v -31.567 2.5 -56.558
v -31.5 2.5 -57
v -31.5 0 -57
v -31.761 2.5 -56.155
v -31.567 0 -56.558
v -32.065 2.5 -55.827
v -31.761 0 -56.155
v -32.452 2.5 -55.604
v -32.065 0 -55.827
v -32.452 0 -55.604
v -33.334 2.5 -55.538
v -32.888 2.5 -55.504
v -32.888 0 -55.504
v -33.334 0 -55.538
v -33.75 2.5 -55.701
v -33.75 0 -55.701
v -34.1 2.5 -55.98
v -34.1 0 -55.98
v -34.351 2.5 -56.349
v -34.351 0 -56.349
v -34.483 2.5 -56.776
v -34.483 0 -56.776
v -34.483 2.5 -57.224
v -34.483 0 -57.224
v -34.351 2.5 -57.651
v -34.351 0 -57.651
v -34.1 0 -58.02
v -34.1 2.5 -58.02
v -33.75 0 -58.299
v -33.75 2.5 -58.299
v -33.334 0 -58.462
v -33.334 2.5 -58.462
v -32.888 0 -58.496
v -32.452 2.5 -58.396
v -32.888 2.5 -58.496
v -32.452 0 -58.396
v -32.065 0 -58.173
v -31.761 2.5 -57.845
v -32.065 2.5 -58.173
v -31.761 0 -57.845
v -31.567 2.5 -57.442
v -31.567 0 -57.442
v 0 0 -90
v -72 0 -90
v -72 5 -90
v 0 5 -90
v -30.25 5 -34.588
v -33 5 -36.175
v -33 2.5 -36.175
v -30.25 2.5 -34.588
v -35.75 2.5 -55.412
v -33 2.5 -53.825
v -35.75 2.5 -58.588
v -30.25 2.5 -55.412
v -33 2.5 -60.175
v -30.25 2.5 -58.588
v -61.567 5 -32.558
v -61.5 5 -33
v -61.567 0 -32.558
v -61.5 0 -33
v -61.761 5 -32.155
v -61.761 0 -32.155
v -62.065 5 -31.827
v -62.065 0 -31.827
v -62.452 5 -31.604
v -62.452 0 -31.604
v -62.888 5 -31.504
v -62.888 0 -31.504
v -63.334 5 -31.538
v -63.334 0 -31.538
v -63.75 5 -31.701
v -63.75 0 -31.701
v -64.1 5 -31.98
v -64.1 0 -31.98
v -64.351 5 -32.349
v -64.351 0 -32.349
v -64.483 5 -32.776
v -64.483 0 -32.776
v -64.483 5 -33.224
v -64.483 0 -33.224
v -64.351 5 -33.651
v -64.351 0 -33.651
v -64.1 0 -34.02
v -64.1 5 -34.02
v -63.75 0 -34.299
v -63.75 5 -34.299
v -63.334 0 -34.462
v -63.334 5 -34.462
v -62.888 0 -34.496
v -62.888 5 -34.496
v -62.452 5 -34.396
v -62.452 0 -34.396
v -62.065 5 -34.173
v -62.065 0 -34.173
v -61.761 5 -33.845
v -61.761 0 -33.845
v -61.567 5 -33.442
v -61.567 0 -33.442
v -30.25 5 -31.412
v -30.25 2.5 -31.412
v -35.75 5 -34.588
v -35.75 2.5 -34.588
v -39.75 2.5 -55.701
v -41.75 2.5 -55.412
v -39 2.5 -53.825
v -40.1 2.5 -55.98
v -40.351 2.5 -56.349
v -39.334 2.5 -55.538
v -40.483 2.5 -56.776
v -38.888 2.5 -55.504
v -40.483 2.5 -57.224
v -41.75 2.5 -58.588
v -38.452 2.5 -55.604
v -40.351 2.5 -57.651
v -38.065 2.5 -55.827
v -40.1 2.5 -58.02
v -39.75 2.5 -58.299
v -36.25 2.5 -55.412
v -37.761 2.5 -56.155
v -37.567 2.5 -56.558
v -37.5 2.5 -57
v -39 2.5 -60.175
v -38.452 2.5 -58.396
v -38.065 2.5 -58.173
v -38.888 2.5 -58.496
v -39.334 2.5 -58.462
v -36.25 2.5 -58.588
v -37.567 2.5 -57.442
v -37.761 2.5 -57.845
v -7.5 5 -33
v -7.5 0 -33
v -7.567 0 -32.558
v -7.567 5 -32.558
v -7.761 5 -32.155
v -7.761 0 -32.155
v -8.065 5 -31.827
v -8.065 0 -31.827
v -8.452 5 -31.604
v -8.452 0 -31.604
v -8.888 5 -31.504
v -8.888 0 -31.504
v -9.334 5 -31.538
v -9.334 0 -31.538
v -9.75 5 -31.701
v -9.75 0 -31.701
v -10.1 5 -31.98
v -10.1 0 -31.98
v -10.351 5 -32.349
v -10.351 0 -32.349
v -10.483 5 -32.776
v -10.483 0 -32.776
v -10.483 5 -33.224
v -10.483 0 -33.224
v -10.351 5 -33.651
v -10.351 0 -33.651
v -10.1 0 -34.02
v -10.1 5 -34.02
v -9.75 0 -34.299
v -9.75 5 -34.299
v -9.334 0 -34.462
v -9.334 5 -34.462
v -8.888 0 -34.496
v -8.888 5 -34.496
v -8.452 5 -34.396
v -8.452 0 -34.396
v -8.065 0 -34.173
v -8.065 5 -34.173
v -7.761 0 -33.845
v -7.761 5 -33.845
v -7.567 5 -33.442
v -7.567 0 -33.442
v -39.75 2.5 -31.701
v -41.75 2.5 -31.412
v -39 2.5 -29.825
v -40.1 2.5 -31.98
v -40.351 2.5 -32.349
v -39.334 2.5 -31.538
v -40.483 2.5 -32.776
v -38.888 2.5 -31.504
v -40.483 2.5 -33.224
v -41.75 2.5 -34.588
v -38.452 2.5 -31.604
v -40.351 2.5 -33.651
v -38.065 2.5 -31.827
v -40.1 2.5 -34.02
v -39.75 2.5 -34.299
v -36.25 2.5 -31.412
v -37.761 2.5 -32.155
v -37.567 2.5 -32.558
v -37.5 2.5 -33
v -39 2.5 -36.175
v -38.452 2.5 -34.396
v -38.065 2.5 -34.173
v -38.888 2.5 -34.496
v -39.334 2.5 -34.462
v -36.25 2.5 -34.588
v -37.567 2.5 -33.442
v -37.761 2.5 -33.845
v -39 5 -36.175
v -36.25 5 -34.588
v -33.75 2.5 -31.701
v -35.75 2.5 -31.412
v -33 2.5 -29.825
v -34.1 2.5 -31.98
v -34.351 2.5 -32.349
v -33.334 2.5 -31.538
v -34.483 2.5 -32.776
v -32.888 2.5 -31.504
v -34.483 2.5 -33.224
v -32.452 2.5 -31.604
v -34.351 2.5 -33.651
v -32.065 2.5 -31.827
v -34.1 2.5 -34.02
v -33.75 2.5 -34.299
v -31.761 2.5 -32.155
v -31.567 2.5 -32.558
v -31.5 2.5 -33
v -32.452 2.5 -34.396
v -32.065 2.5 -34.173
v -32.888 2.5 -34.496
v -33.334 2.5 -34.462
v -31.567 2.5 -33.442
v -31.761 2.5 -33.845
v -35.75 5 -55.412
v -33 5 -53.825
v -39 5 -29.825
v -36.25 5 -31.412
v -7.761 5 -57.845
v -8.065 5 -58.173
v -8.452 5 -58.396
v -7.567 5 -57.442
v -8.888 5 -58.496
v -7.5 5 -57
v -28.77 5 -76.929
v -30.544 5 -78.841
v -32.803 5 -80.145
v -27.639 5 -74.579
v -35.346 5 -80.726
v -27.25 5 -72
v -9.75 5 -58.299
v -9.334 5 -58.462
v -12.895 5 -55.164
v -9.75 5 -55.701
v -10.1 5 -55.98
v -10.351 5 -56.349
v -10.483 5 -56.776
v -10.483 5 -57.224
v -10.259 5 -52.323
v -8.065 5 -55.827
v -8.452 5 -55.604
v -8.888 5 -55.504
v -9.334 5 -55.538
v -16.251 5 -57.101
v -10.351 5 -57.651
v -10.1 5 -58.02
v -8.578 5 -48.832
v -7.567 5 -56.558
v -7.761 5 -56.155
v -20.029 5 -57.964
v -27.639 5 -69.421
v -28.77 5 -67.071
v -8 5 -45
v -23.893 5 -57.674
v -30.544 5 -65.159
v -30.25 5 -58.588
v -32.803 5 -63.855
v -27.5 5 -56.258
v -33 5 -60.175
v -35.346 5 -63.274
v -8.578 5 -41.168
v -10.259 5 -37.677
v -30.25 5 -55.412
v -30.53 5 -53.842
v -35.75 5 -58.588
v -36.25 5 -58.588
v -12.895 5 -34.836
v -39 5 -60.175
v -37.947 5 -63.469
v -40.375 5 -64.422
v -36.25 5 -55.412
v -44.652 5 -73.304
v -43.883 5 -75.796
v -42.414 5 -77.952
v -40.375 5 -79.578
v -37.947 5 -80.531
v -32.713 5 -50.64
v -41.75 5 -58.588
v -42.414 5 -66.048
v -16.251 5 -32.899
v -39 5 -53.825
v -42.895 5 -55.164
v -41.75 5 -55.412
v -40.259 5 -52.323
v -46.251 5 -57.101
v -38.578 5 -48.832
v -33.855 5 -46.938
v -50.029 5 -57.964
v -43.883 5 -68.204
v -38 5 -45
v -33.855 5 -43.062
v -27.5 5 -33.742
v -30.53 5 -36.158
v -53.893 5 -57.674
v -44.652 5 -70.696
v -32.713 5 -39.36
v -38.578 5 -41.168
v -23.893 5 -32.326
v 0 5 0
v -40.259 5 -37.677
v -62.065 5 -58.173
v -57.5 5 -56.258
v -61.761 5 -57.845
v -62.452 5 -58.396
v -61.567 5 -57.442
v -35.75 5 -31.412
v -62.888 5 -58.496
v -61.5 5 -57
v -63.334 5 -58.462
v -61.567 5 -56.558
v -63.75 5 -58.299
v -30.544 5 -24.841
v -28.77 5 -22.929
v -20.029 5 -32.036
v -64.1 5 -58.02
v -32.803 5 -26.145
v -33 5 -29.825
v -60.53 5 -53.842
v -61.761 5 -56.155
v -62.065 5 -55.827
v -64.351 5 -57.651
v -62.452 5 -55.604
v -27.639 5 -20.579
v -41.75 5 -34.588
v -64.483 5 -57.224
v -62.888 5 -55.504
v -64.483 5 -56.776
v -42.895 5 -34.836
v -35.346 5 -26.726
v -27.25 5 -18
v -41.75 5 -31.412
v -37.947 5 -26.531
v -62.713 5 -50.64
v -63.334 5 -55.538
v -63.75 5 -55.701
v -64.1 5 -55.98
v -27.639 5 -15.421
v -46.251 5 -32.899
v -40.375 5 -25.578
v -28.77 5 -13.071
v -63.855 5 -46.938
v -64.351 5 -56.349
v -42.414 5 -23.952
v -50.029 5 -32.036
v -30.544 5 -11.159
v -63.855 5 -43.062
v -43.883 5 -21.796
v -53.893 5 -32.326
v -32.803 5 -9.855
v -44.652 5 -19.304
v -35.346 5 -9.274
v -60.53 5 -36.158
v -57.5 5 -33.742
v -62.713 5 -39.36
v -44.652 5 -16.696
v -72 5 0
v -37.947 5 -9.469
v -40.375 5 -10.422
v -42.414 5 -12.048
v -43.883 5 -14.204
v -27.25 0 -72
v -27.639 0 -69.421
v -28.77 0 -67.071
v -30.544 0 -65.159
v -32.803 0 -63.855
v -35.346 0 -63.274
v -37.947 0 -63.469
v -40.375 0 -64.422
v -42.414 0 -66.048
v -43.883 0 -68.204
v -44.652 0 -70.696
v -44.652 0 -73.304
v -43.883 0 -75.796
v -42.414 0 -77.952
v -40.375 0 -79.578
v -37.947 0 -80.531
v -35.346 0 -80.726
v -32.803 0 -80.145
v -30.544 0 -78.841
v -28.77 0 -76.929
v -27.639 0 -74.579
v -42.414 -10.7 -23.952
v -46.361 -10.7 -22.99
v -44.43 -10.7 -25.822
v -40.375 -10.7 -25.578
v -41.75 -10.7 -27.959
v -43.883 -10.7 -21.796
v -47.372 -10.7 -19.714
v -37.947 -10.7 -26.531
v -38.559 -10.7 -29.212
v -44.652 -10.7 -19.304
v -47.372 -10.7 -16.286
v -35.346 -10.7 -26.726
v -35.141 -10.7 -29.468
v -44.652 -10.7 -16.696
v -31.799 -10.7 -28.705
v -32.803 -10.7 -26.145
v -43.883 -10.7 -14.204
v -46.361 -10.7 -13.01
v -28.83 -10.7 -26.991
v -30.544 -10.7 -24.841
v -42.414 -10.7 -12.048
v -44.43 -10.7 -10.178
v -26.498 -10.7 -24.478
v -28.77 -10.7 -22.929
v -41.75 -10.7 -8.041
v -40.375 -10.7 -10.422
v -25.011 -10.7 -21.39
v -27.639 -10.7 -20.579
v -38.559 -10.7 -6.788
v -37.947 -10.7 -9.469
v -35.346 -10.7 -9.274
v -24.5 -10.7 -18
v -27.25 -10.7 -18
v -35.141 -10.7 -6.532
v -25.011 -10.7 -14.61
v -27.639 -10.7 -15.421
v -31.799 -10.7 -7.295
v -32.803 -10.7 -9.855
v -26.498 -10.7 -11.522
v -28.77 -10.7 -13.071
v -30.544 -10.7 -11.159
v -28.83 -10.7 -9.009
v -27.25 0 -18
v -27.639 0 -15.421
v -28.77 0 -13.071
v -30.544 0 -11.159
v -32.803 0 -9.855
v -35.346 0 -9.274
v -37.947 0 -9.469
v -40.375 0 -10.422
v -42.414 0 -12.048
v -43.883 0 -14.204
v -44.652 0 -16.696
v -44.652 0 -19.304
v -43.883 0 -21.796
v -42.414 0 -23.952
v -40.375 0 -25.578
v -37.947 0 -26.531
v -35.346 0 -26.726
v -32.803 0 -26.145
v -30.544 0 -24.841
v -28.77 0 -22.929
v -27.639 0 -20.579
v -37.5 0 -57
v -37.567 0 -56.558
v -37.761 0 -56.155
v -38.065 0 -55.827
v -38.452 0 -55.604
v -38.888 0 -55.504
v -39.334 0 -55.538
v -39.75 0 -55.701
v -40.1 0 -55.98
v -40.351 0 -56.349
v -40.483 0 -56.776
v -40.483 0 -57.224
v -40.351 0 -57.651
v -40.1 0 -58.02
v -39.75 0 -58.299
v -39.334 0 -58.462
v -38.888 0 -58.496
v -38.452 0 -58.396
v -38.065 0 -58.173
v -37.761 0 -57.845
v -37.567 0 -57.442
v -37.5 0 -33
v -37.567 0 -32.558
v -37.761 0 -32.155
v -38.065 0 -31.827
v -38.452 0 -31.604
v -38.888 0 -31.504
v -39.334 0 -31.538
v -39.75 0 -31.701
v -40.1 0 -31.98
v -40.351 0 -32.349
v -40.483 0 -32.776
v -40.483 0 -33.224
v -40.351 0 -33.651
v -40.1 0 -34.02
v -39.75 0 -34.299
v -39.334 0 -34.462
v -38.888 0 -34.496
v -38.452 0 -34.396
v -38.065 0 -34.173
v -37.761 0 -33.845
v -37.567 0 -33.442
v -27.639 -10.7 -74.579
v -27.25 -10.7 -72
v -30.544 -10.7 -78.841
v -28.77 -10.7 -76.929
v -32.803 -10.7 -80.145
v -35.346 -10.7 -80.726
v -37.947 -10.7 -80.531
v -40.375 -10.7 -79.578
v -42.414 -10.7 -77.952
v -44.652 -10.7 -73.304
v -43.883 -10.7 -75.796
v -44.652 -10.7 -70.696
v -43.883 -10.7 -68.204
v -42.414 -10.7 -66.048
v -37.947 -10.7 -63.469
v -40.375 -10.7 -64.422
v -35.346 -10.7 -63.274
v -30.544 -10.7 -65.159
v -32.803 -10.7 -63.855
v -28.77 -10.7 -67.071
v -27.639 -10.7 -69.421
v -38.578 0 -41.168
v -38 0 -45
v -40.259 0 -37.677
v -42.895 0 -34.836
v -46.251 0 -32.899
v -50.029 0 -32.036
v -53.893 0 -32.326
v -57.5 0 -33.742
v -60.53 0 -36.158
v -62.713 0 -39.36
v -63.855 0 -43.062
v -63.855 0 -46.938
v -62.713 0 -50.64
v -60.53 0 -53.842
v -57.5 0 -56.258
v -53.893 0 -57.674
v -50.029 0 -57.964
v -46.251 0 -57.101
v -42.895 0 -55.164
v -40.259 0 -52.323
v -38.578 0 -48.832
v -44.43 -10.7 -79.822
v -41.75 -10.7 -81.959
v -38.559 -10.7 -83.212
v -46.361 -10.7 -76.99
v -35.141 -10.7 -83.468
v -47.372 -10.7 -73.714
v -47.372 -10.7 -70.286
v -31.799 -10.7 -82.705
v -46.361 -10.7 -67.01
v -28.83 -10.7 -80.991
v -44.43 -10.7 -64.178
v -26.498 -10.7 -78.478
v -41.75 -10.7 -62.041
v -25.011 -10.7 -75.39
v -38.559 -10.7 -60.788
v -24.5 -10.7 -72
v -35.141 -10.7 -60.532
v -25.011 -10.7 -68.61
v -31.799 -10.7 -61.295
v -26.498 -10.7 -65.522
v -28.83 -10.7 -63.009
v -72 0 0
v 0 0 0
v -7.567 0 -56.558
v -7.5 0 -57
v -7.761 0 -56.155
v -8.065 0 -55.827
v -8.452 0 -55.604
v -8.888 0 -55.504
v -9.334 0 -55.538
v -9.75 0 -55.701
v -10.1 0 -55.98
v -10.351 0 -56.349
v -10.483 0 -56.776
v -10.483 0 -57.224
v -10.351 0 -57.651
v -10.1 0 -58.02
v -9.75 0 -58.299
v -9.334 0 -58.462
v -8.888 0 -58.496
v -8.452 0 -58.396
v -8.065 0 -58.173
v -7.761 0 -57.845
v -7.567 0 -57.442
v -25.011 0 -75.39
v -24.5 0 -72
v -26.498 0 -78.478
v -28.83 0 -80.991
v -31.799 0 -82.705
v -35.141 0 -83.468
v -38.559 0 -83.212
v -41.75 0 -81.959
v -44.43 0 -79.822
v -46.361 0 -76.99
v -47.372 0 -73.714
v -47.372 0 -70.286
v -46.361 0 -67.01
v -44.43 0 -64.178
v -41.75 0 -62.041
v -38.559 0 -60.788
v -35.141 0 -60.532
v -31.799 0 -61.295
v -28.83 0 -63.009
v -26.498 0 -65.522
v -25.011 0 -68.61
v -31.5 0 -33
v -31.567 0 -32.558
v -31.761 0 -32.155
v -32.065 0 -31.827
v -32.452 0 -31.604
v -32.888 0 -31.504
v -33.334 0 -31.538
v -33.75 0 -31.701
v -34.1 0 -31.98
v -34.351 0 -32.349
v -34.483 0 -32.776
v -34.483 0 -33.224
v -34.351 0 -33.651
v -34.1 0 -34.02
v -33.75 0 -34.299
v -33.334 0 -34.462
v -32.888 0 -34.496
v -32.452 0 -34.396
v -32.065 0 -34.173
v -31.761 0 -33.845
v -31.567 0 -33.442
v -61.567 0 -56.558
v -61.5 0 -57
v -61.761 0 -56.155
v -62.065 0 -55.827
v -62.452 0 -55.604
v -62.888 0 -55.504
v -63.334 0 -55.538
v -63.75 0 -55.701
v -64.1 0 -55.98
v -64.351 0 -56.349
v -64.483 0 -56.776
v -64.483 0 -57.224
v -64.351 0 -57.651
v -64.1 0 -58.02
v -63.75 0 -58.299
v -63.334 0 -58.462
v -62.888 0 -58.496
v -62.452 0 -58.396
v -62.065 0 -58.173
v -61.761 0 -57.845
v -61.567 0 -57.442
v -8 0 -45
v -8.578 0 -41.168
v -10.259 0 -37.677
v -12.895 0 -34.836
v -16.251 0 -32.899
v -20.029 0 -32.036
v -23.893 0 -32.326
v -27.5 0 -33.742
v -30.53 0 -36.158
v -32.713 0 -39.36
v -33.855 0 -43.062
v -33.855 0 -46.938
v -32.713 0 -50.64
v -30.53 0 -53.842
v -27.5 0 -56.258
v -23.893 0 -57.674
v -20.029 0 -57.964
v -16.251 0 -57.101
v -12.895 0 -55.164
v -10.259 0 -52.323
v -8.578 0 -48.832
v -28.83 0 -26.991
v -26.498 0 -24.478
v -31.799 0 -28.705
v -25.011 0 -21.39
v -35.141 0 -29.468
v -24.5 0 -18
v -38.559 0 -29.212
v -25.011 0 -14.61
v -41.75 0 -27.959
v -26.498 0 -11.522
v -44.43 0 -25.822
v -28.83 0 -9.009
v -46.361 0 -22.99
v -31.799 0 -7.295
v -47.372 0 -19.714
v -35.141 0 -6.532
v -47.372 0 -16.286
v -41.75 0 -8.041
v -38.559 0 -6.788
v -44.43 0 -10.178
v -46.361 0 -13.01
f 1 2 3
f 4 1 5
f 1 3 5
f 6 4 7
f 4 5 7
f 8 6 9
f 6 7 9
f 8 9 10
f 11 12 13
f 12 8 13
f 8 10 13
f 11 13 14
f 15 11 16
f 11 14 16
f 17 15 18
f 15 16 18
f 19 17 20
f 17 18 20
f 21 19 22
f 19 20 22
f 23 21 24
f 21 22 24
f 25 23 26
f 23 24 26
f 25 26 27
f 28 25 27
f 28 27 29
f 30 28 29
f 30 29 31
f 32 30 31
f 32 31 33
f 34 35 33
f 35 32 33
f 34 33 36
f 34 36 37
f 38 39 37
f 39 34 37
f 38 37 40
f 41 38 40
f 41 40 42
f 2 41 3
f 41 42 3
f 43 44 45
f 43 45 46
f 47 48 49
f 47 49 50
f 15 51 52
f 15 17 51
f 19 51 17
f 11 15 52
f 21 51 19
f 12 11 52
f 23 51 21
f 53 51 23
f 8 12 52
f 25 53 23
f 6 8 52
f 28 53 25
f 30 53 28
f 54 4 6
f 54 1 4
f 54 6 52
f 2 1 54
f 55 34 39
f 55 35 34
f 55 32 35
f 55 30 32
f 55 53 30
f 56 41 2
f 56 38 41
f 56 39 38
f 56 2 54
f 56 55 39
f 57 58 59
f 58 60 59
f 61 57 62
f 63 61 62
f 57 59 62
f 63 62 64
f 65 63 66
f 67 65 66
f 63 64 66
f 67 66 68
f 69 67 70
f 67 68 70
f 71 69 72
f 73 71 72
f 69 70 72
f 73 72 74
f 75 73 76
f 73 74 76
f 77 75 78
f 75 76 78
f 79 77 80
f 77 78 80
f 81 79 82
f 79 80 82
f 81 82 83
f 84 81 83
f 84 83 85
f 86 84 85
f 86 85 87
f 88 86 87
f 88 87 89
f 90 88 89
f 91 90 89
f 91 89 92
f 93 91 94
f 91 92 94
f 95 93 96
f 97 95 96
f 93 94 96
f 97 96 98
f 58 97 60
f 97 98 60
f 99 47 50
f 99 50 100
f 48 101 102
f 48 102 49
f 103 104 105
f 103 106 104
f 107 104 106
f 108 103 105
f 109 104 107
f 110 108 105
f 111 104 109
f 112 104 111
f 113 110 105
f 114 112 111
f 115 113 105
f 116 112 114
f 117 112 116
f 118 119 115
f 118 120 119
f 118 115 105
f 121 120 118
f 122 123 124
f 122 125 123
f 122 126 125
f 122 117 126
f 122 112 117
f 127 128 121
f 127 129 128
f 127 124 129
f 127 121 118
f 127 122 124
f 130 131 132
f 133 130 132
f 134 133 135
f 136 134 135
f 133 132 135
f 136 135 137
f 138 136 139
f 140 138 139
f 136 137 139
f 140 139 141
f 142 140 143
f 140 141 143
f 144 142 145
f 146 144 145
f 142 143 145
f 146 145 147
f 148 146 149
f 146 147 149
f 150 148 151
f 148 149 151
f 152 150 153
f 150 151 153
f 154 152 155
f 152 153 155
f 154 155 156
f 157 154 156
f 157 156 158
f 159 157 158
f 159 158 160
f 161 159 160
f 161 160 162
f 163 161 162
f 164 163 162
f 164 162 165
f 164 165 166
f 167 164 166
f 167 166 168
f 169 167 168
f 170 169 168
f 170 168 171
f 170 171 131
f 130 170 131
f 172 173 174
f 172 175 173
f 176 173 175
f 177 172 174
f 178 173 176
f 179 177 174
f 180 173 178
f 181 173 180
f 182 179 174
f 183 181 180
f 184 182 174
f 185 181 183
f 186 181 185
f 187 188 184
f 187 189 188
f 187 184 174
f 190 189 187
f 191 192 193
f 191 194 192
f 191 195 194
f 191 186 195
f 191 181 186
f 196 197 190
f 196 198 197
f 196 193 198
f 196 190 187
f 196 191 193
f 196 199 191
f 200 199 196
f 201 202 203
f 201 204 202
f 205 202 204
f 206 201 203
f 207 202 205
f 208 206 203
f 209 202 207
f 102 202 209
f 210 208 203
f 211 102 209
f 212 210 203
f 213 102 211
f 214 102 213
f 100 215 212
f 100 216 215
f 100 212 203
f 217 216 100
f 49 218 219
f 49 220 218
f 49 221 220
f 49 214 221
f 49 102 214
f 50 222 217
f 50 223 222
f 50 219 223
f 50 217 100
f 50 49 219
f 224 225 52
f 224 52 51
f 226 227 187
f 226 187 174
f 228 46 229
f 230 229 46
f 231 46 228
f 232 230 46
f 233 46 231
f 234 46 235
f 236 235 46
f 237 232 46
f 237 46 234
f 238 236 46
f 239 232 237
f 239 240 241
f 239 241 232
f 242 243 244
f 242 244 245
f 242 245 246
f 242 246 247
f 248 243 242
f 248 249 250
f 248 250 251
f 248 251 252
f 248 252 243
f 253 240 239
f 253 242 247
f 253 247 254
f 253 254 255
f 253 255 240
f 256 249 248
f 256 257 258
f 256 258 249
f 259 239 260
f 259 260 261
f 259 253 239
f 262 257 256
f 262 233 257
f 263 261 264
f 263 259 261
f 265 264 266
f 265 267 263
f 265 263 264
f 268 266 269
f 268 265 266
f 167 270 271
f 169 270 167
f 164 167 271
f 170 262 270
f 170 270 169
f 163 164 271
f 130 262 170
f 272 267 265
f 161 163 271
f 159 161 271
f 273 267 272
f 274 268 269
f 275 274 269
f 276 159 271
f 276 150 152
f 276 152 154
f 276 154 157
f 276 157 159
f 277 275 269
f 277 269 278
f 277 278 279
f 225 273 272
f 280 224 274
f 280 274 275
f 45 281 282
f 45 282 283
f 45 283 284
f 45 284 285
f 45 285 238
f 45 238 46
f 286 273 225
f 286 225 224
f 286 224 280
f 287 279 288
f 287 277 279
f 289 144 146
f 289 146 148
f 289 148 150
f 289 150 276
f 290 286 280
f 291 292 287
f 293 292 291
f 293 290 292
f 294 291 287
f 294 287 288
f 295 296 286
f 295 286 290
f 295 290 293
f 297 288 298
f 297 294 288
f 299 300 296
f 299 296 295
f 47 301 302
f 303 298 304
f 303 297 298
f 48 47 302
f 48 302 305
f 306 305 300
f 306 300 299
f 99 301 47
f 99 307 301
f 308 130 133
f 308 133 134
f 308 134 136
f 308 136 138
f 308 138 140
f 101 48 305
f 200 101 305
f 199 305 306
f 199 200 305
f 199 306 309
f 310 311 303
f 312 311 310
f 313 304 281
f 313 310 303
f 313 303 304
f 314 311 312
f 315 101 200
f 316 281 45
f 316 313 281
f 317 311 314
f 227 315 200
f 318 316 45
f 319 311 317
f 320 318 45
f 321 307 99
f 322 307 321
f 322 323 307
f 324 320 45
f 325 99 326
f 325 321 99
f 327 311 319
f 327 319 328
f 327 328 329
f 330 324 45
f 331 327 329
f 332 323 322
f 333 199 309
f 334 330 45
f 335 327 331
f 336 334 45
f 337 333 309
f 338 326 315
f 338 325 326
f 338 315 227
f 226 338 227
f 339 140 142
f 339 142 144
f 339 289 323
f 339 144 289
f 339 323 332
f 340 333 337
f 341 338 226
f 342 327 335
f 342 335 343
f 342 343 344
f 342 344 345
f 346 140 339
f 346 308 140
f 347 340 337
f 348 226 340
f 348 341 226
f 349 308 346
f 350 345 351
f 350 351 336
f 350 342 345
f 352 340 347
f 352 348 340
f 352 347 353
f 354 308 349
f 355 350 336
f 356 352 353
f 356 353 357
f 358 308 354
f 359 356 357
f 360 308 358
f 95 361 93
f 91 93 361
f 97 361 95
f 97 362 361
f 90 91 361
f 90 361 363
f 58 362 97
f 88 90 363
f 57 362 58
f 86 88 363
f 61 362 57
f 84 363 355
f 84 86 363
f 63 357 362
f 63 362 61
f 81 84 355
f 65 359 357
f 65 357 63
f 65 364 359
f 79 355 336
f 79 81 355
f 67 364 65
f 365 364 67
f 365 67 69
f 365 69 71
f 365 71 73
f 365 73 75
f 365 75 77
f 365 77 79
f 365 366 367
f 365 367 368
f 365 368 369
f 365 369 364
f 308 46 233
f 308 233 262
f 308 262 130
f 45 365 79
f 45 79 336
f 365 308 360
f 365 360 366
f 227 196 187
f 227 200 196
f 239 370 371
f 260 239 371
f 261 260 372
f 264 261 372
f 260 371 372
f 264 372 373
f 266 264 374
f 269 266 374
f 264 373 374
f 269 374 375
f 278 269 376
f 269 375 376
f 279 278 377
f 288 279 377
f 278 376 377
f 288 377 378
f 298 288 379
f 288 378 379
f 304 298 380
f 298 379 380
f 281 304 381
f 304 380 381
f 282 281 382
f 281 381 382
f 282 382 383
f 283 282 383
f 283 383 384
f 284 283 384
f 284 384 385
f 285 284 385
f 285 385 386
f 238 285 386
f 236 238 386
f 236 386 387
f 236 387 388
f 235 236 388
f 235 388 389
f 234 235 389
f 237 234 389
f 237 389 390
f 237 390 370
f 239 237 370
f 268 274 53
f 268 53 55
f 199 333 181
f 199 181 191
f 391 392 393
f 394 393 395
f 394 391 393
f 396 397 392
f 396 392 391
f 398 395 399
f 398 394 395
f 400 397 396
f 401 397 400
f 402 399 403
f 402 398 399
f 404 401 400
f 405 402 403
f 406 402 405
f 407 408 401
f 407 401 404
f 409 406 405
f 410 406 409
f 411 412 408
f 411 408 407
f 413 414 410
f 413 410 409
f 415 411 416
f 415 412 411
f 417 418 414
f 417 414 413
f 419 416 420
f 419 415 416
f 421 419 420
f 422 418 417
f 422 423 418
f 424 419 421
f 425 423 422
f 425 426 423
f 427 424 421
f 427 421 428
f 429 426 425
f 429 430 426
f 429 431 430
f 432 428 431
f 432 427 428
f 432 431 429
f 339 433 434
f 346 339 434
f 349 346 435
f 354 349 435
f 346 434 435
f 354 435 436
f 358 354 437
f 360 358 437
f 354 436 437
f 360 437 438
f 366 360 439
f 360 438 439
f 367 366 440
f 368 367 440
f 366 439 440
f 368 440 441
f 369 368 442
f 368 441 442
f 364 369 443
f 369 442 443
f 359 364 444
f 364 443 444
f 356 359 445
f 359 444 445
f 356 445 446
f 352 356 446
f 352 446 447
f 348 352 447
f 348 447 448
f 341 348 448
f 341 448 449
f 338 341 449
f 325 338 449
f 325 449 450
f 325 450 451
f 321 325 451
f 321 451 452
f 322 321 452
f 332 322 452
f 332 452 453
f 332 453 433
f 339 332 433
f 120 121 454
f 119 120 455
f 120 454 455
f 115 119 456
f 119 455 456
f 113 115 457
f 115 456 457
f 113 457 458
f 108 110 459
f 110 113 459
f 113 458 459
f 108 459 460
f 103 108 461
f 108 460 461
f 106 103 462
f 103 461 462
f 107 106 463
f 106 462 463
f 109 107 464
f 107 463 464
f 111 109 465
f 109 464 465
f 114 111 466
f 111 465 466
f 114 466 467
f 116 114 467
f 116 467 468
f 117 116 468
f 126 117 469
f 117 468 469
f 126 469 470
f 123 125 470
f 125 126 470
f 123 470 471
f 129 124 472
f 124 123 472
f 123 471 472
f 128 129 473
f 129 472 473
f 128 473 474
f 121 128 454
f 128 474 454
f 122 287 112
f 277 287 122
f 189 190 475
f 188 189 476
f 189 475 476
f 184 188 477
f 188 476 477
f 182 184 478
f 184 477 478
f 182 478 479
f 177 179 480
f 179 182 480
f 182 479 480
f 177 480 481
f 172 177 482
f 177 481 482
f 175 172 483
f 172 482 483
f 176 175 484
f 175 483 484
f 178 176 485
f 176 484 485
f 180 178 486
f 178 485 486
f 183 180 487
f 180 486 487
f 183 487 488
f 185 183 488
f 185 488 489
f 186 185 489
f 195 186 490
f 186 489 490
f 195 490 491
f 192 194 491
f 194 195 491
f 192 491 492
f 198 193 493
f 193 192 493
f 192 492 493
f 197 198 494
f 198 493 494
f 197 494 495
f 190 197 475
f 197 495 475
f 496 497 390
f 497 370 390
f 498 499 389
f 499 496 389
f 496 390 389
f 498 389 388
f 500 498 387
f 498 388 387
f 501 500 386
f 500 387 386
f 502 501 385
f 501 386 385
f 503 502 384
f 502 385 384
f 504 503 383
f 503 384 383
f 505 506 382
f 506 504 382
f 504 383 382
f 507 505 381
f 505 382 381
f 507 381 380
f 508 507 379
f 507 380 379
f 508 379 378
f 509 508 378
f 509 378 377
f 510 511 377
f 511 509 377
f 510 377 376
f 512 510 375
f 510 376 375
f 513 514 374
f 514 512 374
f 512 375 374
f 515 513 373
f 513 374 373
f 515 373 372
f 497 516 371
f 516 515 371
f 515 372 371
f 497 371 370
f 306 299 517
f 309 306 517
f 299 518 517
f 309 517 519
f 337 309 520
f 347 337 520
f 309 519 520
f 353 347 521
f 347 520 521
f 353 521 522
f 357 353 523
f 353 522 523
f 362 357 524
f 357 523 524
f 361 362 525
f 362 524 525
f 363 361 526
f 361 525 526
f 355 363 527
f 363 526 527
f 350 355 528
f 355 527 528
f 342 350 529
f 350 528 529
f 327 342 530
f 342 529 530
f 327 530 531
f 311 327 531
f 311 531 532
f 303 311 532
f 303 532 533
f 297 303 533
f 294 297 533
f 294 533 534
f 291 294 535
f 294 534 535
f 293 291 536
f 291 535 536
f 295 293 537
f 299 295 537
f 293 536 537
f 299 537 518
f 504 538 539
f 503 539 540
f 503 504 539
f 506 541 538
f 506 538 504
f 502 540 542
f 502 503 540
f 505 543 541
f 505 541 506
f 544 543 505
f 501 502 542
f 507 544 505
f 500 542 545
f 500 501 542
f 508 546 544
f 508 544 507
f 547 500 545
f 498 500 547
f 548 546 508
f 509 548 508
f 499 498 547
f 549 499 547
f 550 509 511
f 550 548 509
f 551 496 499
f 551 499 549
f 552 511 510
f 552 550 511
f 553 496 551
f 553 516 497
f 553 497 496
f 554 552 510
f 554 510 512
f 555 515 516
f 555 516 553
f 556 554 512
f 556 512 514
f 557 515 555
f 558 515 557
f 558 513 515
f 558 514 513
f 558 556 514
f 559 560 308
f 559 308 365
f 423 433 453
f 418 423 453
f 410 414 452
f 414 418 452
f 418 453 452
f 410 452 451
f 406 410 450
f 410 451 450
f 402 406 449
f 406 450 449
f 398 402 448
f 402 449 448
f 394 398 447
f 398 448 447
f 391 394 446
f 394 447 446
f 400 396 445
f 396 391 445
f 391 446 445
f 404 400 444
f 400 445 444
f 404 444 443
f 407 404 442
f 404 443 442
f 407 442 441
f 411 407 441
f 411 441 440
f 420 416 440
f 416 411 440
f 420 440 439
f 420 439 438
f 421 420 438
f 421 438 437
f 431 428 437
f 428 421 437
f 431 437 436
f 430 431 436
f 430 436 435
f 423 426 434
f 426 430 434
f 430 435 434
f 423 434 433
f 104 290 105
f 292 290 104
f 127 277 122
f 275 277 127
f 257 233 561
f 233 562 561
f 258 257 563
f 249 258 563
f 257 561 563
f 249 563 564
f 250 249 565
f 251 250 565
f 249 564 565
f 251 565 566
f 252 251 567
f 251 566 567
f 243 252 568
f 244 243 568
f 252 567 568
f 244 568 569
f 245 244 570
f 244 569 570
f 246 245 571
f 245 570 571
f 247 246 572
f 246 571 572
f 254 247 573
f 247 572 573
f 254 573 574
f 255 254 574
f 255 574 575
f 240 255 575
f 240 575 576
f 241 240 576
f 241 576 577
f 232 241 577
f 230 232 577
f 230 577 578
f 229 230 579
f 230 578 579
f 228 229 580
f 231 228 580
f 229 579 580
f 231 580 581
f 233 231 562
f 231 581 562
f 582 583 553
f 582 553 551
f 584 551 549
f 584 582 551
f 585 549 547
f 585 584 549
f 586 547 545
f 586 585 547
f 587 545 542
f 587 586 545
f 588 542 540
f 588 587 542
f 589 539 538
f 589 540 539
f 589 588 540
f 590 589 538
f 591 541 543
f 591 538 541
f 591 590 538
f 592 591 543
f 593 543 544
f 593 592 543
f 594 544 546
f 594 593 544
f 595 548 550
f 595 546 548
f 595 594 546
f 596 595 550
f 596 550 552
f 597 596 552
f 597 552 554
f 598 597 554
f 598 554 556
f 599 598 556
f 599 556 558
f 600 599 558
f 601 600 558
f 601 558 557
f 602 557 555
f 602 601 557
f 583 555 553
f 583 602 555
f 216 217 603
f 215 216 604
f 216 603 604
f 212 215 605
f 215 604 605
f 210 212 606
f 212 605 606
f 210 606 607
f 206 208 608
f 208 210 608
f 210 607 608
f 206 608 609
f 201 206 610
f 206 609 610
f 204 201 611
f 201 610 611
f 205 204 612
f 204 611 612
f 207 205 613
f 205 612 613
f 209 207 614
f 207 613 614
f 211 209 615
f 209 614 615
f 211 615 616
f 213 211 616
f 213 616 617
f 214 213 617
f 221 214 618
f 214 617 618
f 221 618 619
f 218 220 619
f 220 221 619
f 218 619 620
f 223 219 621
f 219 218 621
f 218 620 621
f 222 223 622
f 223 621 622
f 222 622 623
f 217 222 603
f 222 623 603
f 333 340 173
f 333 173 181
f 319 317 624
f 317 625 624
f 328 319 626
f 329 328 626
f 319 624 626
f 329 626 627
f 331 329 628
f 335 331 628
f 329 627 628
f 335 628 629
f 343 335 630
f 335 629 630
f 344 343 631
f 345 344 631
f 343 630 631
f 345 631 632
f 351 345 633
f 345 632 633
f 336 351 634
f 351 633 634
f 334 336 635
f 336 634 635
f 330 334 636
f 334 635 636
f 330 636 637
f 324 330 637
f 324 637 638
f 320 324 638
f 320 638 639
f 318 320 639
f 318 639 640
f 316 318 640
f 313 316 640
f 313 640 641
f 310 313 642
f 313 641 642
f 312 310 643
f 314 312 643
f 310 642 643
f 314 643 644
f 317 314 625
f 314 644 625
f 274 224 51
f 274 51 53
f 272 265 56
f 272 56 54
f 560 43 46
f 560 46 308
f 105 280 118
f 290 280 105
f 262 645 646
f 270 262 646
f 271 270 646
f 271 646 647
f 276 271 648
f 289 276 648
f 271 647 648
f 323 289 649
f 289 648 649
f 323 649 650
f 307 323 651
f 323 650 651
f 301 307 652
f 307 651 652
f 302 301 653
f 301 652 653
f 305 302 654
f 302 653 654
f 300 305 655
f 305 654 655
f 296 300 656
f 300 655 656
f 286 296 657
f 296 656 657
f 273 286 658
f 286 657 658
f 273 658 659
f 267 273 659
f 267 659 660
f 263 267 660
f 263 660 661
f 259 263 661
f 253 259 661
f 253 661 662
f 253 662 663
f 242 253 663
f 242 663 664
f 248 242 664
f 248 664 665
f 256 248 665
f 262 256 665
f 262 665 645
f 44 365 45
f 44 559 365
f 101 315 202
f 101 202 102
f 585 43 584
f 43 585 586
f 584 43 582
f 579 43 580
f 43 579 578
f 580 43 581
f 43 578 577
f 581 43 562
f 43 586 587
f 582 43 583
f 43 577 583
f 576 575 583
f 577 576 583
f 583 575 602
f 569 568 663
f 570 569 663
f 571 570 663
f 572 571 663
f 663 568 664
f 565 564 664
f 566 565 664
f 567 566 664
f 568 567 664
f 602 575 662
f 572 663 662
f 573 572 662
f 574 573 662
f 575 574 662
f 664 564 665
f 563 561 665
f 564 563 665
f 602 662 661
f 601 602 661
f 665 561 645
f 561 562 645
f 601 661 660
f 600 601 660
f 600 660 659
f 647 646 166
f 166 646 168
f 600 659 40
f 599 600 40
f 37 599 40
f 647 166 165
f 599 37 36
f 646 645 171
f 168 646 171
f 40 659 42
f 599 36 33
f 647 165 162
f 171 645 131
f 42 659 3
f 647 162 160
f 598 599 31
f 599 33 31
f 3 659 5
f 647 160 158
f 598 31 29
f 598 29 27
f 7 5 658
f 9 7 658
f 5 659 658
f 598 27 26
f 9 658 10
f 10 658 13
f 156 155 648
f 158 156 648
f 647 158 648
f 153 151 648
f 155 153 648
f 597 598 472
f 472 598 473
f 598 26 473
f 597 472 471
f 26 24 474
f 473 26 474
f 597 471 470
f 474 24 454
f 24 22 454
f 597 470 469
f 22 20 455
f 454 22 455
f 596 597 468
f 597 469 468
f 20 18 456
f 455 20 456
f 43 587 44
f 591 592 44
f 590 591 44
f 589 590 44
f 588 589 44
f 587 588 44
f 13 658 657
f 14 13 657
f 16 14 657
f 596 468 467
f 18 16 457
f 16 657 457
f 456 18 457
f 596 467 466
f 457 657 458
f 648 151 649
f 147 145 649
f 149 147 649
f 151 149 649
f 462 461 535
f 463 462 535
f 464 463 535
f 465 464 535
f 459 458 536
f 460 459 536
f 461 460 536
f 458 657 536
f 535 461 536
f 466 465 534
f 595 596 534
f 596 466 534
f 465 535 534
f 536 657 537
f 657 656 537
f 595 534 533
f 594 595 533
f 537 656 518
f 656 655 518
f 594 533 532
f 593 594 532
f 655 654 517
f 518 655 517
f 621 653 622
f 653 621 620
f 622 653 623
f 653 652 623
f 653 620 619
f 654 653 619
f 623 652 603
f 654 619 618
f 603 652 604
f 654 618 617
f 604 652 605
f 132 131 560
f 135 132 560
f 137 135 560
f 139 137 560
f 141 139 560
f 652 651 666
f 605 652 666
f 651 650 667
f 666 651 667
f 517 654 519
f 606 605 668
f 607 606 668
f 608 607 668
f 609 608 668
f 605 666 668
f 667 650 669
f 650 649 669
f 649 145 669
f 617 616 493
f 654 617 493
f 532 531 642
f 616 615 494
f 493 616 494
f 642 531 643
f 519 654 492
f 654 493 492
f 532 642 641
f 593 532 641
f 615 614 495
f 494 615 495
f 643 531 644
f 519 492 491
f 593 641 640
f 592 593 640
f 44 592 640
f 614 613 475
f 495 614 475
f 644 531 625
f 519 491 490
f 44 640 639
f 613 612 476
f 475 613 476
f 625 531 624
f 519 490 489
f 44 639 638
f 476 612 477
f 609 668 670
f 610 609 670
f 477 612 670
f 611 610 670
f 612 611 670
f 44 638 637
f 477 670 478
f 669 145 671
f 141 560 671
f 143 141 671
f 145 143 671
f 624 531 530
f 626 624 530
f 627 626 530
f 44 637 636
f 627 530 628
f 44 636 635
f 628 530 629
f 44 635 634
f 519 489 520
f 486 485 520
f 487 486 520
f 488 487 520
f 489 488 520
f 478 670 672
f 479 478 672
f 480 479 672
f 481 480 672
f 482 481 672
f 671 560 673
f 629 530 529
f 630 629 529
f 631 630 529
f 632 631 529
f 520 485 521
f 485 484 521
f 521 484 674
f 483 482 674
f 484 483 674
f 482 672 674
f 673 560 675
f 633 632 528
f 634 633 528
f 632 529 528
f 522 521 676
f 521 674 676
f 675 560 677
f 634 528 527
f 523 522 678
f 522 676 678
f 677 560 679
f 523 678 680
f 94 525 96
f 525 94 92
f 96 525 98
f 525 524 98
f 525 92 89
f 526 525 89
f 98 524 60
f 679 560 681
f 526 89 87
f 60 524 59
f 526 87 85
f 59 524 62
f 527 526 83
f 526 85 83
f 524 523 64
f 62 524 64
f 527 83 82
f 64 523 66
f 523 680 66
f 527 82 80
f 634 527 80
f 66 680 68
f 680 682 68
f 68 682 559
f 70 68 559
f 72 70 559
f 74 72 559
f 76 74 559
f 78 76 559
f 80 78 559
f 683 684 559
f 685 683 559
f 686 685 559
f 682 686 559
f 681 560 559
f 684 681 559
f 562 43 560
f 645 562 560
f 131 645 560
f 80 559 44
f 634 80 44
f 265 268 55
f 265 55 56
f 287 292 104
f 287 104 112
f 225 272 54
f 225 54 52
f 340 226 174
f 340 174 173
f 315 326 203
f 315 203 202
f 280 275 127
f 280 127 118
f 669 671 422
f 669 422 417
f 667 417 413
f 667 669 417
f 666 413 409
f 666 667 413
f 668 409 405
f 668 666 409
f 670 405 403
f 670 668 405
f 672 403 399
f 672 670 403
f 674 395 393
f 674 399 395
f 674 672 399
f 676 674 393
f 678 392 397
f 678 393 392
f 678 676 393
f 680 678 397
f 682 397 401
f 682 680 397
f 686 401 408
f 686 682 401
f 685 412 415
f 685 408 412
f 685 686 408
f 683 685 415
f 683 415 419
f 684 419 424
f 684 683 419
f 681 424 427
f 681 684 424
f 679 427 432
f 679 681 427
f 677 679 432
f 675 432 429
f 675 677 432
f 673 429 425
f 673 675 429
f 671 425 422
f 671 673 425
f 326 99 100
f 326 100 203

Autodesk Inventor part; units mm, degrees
ref_plane "YZ Plane" through (0, 0, 0) normal (1, 0, 0) x (0, 1, 0)
ref_plane "XZ Plane" through (0, 0, 0) normal (0, 1, 0) x (-1, 0, 0)
ref_plane "XY Plane" through (0, 0, 0) normal (0, 0, 1) x (1, 0, 0)
sketch "Sketch1" plane through (0, 0, 0) normal (0, 1, 0) x (-1, 0, 0)
  line L0 (0, 0) -> (72, 0)
  line L1 (72, 0) -> (72, -90)
  line L2 (72, -90) -> (0, -90)
  line L3 (0, -90) -> (0, 0)
  dimension "d0" = 72
  dimension "d1" = 90
extrude "Extrusion1" add sketch "Sketch1" along normal blind 5
sketch "Sketch2" plane through (0, 0, 0) normal (0, -1, 0) x (1, 0, 0)
  line L0 (-72, 0) -> (-72, -90) projected
  line L1 (-72, -90) -> (0, -90) projected
  circle A0 centre (-36, -72) radius 8.75
  circle A1 centre (-36, -18) radius 8.75
  circle A2 centre (-36, -18) radius 11.5
  circle A3 centre (-36, -72) radius 11.5
  dimension "d4" = 17.5
  dimension "d5" = 23
  dimension "d6" = 54
  dimension "d7" = 18
  dimension "d8" = 36
extrude "Extrusion2" add sketch "Sketch2" along normal blind 10.7
sketch "Sketch3" plane through (-36, 0, -18) normal (0, -1, 0) x (1, 0, 0)
  circle A0 centre (0, 0) radius 8.75 projected
  circle A1 centre (0, -54) radius 8.75 projected
  point P0 (36, 18)
extrude "Extrusion3" cut sketch "Sketch3" against normal up to surface (5 mm away)
sketch "Sketch4" plane through (0, 0, 0) normal (0, -1, 0) x (1, 0, 0)
  line L0 (0, 0) -> (-72, 0) projected
  line L1 (-72, 0) -> (-72, -90) projected
  line L2 (0, -90) -> (0, 0) projected
  circle A0 centre (-21, -45) radius 13
  circle A1 centre (-51, -45) radius 13
  dimension "d14" = 26
  dimension "d16" = 21
  dimension "d17" = 21
  dimension "d18" = 45
extrude "Extrusion4" cut sketch "Sketch4" against normal up to surface (5 mm away)
sketch "Sketch5" plane through (0, 0, 0) normal (0, -1, 0) x (1, 0, 0)
  circle A0 centre (-21, -45) radius 13 projected
  circle A1 centre (-51, -45) radius 13 projected
  circle A2 centre (-9, -57) radius 1.5
  circle A3 centre (-9, -33) radius 1.5
  circle A4 centre (-33, -57) radius 1.5
  circle A5 centre (-33, -33) radius 1.5
  circle A6 centre (-39, -33) radius 1.5
  circle A7 centre (-39, -57) radius 1.5
  circle A8 centre (-63, -57) radius 1.5
  circle A9 centre (-63, -33) radius 1.5
  dimension "d21" = 3
  dimension "d22" = 24
  dimension "d23" = 24
  dimension "d24" = 24
  dimension "d25" = 12
  dimension "d26" = 12
  dimension "d27" = 12
extrude "Extrusion5" cut sketch "Sketch5" against normal up to surface (5 mm away) contours A2 | A3 | A4 | A5 | A6 | A7 | A8 | A9
sketch "Sketch6" plane through (0, 5, 0) normal (0, 1, 0) x (1, 0, 0)
  circle A0 centre (-39, 57) radius 1.5 projected
  circle A1 centre (-33, 33) radius 1.5 projected
  circle A2 centre (-33, 57) radius 1.5 projected
  circle A3 centre (-39, 33) radius 1.5 projected
  line L0 (-39, 60.1754) -> (-36.25, 58.5877)
  line L1 (-36.25, 58.5877) -> (-36.25, 55.4123)
  line L2 (-36.25, 55.4123) -> (-39, 53.8246)
  line L3 (-39, 53.8246) -> (-41.75, 55.4123)
  line L4 (-41.75, 55.4123) -> (-41.75, 58.5877)
  line L5 (-41.75, 58.5877) -> (-39, 60.1754)
  line L6 (-39, 36.1754) -> (-36.25, 34.5877)
  line L7 (-36.25, 34.5877) -> (-36.25, 31.4123)
  line L8 (-36.25, 31.4123) -> (-39, 29.8246)
  line L9 (-39, 29.8246) -> (-41.75, 31.4123)
  line L10 (-41.75, 31.4123) -> (-41.75, 34.5877)
  line L11 (-41.75, 34.5877) -> (-39, 36.1754)
  line L12 (-33, 36.1754) -> (-30.25, 34.5877)
  line L13 (-30.25, 34.5877) -> (-30.25, 31.4123)
  line L14 (-30.25, 31.4123) -> (-33, 29.8246)
  line L15 (-33, 29.8246) -> (-35.75, 31.4123)
  line L16 (-35.75, 31.4123) -> (-35.75, 34.5877)
  line L17 (-35.75, 34.5877) -> (-33, 36.1754)
  line L18 (-33, 60.1754) -> (-30.25, 58.5877)
  line L19 (-30.25, 58.5877) -> (-30.25, 55.4123)
  line L20 (-30.25, 55.4123) -> (-33, 53.8246)
  line L21 (-33, 53.8246) -> (-35.75, 55.4123)
  line L22 (-35.75, 55.4123) -> (-35.75, 58.5877)
  line L23 (-35.75, 58.5877) -> (-33, 60.1754)
  dimension "d30" = 5.5
extrude "Extrusion6" cut sketch "Sketch6" against normal blind 2.5
properties part number "XCarriageV9Top" material "ABS Plastic"
